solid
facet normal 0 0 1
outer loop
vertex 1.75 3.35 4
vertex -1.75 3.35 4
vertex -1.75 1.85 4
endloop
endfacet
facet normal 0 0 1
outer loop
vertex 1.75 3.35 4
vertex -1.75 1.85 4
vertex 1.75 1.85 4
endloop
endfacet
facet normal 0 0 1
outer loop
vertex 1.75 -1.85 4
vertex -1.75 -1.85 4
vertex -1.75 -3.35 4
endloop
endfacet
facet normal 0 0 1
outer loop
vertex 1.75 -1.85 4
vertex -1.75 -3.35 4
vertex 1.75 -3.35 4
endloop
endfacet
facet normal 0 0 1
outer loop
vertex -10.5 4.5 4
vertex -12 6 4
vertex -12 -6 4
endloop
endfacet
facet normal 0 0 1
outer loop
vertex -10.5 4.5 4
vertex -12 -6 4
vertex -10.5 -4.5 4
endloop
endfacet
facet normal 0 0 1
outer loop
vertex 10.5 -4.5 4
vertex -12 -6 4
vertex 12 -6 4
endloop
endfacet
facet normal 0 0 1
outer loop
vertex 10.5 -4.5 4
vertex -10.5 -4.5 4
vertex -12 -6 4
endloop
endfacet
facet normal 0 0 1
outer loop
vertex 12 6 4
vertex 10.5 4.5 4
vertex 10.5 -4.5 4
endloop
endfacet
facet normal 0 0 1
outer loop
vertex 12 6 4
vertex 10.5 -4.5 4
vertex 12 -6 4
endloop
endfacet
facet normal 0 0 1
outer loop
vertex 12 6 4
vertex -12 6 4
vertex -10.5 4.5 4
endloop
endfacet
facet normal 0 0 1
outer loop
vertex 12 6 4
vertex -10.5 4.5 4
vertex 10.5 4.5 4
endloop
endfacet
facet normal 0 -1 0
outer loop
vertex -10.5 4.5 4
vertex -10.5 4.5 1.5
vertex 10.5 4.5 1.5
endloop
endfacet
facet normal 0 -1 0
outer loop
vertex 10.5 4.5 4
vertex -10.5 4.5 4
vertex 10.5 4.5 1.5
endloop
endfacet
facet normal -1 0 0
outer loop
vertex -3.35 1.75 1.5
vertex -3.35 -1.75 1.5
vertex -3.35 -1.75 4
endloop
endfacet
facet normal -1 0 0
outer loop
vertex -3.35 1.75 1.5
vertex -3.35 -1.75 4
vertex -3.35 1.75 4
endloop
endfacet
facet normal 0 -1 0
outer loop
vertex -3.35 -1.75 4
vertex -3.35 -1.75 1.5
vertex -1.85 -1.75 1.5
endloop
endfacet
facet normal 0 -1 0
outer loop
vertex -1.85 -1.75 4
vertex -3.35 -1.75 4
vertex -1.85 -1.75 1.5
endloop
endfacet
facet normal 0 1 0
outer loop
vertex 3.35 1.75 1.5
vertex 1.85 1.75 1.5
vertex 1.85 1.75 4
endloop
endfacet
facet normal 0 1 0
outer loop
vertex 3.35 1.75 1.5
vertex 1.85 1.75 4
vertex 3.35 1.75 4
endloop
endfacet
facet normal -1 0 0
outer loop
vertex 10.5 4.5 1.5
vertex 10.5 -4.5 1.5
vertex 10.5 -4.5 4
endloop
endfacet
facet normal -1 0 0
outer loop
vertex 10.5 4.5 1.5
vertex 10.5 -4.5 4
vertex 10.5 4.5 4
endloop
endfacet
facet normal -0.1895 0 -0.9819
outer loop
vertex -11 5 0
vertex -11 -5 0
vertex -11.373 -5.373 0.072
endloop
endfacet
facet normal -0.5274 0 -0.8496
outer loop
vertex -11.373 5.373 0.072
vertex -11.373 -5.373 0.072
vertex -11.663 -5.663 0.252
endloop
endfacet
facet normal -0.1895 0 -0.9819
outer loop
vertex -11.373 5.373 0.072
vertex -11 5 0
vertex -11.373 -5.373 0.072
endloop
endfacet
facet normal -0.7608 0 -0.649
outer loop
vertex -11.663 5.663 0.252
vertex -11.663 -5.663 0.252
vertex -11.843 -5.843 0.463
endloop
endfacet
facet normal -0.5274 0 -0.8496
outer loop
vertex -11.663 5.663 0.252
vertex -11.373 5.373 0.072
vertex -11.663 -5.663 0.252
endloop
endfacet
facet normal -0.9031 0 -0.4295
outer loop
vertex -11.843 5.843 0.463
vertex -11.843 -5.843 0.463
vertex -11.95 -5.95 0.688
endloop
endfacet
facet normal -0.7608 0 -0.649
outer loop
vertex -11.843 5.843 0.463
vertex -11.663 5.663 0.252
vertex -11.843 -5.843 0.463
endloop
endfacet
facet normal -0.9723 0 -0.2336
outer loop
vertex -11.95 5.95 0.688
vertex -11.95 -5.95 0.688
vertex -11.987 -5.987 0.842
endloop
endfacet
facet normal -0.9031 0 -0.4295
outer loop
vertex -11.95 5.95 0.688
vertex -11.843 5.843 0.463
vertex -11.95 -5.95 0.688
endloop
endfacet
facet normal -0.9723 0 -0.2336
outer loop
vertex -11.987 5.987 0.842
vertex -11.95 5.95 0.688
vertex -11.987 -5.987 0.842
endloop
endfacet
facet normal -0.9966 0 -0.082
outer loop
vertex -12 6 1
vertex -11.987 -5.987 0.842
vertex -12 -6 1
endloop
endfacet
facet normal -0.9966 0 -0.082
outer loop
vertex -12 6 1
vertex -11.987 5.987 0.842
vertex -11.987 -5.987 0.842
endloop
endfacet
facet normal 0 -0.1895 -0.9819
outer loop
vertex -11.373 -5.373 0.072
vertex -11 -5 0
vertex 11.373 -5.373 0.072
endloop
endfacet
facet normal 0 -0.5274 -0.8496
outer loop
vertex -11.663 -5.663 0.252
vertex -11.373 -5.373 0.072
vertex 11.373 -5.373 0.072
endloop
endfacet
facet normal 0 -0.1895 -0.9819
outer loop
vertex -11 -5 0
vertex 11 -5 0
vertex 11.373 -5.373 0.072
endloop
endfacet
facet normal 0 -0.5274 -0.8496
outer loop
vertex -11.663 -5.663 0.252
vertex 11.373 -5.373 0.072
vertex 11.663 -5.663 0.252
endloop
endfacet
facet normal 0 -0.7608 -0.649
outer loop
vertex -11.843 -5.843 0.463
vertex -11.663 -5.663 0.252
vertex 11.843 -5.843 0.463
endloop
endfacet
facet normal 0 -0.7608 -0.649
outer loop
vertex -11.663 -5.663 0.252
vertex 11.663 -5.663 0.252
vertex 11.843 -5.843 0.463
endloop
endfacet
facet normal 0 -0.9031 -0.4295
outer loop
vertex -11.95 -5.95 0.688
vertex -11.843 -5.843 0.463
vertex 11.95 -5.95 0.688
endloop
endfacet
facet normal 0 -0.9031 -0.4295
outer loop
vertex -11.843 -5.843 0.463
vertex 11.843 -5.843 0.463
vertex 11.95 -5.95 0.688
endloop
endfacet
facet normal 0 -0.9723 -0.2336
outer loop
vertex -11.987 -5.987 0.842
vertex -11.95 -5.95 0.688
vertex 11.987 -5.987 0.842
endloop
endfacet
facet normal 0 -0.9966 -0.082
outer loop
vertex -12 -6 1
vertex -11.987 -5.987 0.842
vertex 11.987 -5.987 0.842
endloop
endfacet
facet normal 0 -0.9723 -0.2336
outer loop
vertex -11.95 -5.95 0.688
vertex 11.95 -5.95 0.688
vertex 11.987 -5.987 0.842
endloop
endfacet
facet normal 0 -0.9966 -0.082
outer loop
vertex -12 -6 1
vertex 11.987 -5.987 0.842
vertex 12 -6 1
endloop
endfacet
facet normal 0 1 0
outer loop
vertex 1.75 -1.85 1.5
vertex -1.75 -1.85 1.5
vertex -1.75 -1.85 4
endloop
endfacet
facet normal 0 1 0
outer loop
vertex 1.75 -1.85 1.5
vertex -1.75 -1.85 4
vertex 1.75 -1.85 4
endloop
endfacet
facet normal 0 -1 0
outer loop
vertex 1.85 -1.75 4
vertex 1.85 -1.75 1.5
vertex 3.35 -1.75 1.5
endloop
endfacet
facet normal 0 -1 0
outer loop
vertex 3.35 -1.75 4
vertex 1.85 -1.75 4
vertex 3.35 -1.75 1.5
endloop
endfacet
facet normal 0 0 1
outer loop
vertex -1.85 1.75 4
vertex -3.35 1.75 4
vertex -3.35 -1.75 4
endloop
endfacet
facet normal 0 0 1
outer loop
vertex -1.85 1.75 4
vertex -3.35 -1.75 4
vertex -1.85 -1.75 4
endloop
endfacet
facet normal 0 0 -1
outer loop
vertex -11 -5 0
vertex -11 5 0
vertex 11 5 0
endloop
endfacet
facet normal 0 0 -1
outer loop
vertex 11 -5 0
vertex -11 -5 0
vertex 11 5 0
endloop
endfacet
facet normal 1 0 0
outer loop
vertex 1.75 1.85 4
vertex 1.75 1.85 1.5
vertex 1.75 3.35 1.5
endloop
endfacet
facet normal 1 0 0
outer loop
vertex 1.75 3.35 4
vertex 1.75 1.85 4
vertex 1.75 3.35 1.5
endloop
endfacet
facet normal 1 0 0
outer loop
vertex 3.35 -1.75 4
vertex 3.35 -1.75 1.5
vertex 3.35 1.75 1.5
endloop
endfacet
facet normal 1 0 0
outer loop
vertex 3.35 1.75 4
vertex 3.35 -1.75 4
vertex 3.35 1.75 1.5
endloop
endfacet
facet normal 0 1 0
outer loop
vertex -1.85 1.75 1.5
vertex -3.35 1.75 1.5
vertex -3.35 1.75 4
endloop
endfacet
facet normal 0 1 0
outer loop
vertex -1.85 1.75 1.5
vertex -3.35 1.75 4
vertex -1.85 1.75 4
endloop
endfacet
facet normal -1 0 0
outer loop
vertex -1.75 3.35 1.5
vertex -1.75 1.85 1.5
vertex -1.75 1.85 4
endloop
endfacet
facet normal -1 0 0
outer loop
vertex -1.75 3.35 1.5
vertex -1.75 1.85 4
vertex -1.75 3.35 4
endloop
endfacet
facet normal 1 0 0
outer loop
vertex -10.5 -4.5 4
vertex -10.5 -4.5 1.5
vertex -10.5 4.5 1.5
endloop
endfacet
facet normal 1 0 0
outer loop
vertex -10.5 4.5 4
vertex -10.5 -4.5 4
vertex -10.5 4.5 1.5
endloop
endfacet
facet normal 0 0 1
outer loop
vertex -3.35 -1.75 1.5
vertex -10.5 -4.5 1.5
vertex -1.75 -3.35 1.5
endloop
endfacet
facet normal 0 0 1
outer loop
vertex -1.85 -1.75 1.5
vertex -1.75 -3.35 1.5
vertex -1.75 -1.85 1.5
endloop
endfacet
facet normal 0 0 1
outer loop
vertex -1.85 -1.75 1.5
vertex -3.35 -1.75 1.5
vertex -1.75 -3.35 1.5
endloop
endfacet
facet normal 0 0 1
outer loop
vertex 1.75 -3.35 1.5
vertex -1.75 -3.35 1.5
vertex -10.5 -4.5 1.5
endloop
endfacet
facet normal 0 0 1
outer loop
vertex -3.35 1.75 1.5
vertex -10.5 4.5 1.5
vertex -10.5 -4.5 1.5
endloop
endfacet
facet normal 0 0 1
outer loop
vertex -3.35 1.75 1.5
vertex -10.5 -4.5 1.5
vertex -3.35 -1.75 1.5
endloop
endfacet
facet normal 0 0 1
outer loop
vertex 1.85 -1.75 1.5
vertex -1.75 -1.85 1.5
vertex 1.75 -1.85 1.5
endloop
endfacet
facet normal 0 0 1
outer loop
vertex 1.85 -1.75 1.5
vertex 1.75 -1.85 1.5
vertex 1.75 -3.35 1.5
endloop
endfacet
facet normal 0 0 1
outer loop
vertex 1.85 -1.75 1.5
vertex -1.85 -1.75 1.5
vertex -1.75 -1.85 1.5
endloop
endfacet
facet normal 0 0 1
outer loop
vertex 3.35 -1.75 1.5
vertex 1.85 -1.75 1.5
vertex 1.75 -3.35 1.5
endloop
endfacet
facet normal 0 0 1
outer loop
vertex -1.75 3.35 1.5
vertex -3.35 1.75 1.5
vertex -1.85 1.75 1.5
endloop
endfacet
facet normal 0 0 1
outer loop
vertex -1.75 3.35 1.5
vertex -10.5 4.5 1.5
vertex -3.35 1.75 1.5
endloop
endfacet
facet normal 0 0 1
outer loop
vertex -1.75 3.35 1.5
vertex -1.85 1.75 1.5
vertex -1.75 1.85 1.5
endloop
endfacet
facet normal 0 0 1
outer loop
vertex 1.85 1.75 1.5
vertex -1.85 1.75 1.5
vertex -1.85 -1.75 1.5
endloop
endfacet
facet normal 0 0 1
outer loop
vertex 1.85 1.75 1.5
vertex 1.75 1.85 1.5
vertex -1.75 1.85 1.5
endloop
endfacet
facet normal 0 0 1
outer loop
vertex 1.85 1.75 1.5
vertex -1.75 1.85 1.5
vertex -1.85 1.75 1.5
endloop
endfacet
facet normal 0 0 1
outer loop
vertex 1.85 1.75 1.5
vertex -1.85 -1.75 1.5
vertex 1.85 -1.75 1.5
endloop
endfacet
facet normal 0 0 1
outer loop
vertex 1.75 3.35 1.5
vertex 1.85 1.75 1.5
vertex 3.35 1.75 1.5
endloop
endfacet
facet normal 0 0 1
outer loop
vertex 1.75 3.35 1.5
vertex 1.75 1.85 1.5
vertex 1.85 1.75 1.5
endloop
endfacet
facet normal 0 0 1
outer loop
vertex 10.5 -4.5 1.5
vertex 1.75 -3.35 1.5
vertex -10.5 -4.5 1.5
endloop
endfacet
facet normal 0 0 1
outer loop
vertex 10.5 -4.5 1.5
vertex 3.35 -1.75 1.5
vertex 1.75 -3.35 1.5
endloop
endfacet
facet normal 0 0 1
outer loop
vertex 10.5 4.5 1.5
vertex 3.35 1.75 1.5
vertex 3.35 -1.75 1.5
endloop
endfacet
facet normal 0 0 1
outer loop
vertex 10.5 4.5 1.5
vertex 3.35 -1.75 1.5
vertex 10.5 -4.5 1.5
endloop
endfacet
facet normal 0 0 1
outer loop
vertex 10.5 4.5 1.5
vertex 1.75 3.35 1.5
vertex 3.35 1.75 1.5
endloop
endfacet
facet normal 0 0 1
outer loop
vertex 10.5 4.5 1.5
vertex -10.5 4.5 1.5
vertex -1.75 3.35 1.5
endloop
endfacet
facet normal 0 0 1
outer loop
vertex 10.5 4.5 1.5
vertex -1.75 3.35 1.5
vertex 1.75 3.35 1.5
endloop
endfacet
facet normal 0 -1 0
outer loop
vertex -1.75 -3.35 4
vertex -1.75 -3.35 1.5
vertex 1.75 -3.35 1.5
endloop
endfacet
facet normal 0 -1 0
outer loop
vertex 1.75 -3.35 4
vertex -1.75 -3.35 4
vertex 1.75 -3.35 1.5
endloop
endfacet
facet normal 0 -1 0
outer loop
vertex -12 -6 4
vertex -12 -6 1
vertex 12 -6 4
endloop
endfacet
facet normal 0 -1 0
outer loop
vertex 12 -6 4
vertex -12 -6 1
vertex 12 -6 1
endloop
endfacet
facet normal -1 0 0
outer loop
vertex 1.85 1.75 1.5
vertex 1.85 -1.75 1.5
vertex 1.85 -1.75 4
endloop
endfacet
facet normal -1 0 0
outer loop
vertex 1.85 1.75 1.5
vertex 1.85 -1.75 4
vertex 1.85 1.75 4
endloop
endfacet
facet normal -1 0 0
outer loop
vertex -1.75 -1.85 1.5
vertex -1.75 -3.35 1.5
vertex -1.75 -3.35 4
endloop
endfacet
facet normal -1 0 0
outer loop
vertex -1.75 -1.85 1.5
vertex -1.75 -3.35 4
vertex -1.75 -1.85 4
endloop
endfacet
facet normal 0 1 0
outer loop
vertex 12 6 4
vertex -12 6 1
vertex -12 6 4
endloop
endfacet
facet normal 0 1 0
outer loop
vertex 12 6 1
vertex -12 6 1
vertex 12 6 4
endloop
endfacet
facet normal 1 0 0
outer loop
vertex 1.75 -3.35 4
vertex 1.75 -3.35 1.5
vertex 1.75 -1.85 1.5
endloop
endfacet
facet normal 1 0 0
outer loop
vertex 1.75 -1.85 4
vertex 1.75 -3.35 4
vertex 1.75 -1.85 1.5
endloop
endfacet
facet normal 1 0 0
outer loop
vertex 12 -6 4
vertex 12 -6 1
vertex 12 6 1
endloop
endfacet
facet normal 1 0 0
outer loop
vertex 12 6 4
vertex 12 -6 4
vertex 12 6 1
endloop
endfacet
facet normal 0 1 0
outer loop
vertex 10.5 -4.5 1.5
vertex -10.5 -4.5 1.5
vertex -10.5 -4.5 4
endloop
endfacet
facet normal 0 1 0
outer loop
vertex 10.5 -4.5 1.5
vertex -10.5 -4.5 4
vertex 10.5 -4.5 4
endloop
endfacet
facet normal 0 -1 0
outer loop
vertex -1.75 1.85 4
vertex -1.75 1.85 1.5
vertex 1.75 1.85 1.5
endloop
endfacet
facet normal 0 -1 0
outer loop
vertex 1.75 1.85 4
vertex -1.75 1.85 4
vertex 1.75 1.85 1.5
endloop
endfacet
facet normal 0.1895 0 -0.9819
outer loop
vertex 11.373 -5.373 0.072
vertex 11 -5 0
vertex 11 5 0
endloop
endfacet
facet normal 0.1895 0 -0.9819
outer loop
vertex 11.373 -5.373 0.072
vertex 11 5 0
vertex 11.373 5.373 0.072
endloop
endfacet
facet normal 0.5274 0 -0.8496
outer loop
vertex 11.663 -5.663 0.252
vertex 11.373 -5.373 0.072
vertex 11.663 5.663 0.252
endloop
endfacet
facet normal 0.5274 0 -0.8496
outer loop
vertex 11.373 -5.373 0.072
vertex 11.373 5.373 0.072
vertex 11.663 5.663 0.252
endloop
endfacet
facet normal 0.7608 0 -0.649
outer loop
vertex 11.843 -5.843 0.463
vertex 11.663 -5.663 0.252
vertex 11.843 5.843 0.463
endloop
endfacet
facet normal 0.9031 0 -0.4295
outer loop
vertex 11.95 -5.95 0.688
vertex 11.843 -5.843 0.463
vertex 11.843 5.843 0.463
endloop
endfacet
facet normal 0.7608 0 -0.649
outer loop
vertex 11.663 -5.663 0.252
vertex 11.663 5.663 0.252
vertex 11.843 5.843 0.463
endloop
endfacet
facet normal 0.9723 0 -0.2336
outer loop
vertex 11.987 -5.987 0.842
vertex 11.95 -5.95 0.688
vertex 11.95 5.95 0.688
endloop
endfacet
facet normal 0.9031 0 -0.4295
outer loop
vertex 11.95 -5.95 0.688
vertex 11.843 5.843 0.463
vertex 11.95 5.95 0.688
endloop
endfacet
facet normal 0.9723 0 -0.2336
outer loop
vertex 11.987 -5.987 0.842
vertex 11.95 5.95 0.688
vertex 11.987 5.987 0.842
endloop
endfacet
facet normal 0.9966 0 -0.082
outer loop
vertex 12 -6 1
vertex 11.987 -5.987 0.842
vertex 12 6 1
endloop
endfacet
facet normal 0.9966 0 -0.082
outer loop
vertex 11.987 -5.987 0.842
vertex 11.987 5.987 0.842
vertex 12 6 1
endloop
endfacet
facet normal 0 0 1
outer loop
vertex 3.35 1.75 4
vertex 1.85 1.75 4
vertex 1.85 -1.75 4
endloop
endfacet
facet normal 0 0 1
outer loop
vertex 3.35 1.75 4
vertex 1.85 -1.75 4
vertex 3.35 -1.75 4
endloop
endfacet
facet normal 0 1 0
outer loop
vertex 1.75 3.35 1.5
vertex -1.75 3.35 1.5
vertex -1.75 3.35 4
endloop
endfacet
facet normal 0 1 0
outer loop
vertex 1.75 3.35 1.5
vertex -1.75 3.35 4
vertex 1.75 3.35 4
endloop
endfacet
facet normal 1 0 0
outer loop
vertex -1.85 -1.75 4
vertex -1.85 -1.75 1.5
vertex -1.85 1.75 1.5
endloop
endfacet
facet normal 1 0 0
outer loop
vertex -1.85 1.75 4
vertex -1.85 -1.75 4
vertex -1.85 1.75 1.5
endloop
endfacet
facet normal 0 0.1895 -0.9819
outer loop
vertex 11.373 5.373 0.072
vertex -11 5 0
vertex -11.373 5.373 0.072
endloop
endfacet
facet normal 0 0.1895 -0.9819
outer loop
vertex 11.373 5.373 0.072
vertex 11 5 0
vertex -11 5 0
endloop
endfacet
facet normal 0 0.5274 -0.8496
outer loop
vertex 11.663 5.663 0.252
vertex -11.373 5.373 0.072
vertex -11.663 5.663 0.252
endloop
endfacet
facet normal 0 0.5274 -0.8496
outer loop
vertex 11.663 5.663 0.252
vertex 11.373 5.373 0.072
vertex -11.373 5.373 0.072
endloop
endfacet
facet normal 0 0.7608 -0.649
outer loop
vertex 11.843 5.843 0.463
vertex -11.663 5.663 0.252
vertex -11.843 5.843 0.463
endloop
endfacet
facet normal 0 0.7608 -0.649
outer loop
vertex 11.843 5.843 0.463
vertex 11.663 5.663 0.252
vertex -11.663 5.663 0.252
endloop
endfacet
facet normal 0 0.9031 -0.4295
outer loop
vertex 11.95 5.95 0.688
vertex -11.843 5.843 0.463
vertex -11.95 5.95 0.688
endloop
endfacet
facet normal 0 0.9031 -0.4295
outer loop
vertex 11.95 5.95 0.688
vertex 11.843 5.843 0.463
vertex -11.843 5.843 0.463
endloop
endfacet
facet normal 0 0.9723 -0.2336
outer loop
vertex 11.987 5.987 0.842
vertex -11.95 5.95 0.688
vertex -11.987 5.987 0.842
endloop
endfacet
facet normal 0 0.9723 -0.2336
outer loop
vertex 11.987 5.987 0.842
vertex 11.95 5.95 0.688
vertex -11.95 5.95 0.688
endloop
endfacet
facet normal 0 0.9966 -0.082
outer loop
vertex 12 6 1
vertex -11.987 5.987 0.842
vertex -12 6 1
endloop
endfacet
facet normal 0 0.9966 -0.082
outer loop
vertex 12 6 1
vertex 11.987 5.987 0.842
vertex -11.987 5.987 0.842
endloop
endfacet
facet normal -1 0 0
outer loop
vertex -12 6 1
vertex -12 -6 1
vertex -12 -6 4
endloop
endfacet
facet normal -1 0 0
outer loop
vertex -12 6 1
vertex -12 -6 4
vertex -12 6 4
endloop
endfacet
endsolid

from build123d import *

# Parameters (mm, degrees)
SKETCH_W      = 24
SKETCH_H      = 12
PAD_DEPTH     = 1.5
SKETCH002_W   = 3.5
SKETCH002_H   = 1.5
SKETCH002_W_2 = 1.5
SKETCH002_H_2 = 3.5
PAD002_DEPTH  = 4
SKETCH003_W   = 24
SKETCH003_H   = 12
SKETCH003_W_2 = 21
SKETCH003_H_2 = 9
PAD003_DEPTH  = 4
FILLET_R      = 1


with BuildPart() as part:
    # Sketch → Pad (new body)
    with BuildSketch(Plane.XY):
        Rectangle(SKETCH_W, SKETCH_H)
    extrude(amount=PAD_DEPTH)

    # Sketch002 → Pad002 (join)
    with BuildSketch(Plane.XY):
        with Locations((0, 2.6)):
            Rectangle(SKETCH002_W, SKETCH002_H)
        with Locations((0, -2.6)):
            Rectangle(SKETCH002_W, SKETCH002_H)
        with Locations((-2.6, 0)):
            Rectangle(SKETCH002_W_2, SKETCH002_H_2)
        with Locations((2.6, 0)):
            Rectangle(SKETCH002_W_2, SKETCH002_H_2)
    extrude(amount=PAD002_DEPTH)

    # Sketch003 → Pad003 (join)
    with BuildSketch(Plane.XY):
        Rectangle(SKETCH003_W, SKETCH003_H)
        Rectangle(SKETCH003_W_2, SKETCH003_H_2, mode=Mode.SUBTRACT)
    extrude(amount=PAD003_DEPTH)

    # Fillet
    fillet_edges = [part.edges().sort_by_distance(p)[0] for p in [
        (-12, 0, 0),
        (0, -6, 0),
        (12, 0, 0),
        (0, 6, 0),
    ]]
    fillet(fillet_edges, radius=FILLET_R)


solid = part.part
